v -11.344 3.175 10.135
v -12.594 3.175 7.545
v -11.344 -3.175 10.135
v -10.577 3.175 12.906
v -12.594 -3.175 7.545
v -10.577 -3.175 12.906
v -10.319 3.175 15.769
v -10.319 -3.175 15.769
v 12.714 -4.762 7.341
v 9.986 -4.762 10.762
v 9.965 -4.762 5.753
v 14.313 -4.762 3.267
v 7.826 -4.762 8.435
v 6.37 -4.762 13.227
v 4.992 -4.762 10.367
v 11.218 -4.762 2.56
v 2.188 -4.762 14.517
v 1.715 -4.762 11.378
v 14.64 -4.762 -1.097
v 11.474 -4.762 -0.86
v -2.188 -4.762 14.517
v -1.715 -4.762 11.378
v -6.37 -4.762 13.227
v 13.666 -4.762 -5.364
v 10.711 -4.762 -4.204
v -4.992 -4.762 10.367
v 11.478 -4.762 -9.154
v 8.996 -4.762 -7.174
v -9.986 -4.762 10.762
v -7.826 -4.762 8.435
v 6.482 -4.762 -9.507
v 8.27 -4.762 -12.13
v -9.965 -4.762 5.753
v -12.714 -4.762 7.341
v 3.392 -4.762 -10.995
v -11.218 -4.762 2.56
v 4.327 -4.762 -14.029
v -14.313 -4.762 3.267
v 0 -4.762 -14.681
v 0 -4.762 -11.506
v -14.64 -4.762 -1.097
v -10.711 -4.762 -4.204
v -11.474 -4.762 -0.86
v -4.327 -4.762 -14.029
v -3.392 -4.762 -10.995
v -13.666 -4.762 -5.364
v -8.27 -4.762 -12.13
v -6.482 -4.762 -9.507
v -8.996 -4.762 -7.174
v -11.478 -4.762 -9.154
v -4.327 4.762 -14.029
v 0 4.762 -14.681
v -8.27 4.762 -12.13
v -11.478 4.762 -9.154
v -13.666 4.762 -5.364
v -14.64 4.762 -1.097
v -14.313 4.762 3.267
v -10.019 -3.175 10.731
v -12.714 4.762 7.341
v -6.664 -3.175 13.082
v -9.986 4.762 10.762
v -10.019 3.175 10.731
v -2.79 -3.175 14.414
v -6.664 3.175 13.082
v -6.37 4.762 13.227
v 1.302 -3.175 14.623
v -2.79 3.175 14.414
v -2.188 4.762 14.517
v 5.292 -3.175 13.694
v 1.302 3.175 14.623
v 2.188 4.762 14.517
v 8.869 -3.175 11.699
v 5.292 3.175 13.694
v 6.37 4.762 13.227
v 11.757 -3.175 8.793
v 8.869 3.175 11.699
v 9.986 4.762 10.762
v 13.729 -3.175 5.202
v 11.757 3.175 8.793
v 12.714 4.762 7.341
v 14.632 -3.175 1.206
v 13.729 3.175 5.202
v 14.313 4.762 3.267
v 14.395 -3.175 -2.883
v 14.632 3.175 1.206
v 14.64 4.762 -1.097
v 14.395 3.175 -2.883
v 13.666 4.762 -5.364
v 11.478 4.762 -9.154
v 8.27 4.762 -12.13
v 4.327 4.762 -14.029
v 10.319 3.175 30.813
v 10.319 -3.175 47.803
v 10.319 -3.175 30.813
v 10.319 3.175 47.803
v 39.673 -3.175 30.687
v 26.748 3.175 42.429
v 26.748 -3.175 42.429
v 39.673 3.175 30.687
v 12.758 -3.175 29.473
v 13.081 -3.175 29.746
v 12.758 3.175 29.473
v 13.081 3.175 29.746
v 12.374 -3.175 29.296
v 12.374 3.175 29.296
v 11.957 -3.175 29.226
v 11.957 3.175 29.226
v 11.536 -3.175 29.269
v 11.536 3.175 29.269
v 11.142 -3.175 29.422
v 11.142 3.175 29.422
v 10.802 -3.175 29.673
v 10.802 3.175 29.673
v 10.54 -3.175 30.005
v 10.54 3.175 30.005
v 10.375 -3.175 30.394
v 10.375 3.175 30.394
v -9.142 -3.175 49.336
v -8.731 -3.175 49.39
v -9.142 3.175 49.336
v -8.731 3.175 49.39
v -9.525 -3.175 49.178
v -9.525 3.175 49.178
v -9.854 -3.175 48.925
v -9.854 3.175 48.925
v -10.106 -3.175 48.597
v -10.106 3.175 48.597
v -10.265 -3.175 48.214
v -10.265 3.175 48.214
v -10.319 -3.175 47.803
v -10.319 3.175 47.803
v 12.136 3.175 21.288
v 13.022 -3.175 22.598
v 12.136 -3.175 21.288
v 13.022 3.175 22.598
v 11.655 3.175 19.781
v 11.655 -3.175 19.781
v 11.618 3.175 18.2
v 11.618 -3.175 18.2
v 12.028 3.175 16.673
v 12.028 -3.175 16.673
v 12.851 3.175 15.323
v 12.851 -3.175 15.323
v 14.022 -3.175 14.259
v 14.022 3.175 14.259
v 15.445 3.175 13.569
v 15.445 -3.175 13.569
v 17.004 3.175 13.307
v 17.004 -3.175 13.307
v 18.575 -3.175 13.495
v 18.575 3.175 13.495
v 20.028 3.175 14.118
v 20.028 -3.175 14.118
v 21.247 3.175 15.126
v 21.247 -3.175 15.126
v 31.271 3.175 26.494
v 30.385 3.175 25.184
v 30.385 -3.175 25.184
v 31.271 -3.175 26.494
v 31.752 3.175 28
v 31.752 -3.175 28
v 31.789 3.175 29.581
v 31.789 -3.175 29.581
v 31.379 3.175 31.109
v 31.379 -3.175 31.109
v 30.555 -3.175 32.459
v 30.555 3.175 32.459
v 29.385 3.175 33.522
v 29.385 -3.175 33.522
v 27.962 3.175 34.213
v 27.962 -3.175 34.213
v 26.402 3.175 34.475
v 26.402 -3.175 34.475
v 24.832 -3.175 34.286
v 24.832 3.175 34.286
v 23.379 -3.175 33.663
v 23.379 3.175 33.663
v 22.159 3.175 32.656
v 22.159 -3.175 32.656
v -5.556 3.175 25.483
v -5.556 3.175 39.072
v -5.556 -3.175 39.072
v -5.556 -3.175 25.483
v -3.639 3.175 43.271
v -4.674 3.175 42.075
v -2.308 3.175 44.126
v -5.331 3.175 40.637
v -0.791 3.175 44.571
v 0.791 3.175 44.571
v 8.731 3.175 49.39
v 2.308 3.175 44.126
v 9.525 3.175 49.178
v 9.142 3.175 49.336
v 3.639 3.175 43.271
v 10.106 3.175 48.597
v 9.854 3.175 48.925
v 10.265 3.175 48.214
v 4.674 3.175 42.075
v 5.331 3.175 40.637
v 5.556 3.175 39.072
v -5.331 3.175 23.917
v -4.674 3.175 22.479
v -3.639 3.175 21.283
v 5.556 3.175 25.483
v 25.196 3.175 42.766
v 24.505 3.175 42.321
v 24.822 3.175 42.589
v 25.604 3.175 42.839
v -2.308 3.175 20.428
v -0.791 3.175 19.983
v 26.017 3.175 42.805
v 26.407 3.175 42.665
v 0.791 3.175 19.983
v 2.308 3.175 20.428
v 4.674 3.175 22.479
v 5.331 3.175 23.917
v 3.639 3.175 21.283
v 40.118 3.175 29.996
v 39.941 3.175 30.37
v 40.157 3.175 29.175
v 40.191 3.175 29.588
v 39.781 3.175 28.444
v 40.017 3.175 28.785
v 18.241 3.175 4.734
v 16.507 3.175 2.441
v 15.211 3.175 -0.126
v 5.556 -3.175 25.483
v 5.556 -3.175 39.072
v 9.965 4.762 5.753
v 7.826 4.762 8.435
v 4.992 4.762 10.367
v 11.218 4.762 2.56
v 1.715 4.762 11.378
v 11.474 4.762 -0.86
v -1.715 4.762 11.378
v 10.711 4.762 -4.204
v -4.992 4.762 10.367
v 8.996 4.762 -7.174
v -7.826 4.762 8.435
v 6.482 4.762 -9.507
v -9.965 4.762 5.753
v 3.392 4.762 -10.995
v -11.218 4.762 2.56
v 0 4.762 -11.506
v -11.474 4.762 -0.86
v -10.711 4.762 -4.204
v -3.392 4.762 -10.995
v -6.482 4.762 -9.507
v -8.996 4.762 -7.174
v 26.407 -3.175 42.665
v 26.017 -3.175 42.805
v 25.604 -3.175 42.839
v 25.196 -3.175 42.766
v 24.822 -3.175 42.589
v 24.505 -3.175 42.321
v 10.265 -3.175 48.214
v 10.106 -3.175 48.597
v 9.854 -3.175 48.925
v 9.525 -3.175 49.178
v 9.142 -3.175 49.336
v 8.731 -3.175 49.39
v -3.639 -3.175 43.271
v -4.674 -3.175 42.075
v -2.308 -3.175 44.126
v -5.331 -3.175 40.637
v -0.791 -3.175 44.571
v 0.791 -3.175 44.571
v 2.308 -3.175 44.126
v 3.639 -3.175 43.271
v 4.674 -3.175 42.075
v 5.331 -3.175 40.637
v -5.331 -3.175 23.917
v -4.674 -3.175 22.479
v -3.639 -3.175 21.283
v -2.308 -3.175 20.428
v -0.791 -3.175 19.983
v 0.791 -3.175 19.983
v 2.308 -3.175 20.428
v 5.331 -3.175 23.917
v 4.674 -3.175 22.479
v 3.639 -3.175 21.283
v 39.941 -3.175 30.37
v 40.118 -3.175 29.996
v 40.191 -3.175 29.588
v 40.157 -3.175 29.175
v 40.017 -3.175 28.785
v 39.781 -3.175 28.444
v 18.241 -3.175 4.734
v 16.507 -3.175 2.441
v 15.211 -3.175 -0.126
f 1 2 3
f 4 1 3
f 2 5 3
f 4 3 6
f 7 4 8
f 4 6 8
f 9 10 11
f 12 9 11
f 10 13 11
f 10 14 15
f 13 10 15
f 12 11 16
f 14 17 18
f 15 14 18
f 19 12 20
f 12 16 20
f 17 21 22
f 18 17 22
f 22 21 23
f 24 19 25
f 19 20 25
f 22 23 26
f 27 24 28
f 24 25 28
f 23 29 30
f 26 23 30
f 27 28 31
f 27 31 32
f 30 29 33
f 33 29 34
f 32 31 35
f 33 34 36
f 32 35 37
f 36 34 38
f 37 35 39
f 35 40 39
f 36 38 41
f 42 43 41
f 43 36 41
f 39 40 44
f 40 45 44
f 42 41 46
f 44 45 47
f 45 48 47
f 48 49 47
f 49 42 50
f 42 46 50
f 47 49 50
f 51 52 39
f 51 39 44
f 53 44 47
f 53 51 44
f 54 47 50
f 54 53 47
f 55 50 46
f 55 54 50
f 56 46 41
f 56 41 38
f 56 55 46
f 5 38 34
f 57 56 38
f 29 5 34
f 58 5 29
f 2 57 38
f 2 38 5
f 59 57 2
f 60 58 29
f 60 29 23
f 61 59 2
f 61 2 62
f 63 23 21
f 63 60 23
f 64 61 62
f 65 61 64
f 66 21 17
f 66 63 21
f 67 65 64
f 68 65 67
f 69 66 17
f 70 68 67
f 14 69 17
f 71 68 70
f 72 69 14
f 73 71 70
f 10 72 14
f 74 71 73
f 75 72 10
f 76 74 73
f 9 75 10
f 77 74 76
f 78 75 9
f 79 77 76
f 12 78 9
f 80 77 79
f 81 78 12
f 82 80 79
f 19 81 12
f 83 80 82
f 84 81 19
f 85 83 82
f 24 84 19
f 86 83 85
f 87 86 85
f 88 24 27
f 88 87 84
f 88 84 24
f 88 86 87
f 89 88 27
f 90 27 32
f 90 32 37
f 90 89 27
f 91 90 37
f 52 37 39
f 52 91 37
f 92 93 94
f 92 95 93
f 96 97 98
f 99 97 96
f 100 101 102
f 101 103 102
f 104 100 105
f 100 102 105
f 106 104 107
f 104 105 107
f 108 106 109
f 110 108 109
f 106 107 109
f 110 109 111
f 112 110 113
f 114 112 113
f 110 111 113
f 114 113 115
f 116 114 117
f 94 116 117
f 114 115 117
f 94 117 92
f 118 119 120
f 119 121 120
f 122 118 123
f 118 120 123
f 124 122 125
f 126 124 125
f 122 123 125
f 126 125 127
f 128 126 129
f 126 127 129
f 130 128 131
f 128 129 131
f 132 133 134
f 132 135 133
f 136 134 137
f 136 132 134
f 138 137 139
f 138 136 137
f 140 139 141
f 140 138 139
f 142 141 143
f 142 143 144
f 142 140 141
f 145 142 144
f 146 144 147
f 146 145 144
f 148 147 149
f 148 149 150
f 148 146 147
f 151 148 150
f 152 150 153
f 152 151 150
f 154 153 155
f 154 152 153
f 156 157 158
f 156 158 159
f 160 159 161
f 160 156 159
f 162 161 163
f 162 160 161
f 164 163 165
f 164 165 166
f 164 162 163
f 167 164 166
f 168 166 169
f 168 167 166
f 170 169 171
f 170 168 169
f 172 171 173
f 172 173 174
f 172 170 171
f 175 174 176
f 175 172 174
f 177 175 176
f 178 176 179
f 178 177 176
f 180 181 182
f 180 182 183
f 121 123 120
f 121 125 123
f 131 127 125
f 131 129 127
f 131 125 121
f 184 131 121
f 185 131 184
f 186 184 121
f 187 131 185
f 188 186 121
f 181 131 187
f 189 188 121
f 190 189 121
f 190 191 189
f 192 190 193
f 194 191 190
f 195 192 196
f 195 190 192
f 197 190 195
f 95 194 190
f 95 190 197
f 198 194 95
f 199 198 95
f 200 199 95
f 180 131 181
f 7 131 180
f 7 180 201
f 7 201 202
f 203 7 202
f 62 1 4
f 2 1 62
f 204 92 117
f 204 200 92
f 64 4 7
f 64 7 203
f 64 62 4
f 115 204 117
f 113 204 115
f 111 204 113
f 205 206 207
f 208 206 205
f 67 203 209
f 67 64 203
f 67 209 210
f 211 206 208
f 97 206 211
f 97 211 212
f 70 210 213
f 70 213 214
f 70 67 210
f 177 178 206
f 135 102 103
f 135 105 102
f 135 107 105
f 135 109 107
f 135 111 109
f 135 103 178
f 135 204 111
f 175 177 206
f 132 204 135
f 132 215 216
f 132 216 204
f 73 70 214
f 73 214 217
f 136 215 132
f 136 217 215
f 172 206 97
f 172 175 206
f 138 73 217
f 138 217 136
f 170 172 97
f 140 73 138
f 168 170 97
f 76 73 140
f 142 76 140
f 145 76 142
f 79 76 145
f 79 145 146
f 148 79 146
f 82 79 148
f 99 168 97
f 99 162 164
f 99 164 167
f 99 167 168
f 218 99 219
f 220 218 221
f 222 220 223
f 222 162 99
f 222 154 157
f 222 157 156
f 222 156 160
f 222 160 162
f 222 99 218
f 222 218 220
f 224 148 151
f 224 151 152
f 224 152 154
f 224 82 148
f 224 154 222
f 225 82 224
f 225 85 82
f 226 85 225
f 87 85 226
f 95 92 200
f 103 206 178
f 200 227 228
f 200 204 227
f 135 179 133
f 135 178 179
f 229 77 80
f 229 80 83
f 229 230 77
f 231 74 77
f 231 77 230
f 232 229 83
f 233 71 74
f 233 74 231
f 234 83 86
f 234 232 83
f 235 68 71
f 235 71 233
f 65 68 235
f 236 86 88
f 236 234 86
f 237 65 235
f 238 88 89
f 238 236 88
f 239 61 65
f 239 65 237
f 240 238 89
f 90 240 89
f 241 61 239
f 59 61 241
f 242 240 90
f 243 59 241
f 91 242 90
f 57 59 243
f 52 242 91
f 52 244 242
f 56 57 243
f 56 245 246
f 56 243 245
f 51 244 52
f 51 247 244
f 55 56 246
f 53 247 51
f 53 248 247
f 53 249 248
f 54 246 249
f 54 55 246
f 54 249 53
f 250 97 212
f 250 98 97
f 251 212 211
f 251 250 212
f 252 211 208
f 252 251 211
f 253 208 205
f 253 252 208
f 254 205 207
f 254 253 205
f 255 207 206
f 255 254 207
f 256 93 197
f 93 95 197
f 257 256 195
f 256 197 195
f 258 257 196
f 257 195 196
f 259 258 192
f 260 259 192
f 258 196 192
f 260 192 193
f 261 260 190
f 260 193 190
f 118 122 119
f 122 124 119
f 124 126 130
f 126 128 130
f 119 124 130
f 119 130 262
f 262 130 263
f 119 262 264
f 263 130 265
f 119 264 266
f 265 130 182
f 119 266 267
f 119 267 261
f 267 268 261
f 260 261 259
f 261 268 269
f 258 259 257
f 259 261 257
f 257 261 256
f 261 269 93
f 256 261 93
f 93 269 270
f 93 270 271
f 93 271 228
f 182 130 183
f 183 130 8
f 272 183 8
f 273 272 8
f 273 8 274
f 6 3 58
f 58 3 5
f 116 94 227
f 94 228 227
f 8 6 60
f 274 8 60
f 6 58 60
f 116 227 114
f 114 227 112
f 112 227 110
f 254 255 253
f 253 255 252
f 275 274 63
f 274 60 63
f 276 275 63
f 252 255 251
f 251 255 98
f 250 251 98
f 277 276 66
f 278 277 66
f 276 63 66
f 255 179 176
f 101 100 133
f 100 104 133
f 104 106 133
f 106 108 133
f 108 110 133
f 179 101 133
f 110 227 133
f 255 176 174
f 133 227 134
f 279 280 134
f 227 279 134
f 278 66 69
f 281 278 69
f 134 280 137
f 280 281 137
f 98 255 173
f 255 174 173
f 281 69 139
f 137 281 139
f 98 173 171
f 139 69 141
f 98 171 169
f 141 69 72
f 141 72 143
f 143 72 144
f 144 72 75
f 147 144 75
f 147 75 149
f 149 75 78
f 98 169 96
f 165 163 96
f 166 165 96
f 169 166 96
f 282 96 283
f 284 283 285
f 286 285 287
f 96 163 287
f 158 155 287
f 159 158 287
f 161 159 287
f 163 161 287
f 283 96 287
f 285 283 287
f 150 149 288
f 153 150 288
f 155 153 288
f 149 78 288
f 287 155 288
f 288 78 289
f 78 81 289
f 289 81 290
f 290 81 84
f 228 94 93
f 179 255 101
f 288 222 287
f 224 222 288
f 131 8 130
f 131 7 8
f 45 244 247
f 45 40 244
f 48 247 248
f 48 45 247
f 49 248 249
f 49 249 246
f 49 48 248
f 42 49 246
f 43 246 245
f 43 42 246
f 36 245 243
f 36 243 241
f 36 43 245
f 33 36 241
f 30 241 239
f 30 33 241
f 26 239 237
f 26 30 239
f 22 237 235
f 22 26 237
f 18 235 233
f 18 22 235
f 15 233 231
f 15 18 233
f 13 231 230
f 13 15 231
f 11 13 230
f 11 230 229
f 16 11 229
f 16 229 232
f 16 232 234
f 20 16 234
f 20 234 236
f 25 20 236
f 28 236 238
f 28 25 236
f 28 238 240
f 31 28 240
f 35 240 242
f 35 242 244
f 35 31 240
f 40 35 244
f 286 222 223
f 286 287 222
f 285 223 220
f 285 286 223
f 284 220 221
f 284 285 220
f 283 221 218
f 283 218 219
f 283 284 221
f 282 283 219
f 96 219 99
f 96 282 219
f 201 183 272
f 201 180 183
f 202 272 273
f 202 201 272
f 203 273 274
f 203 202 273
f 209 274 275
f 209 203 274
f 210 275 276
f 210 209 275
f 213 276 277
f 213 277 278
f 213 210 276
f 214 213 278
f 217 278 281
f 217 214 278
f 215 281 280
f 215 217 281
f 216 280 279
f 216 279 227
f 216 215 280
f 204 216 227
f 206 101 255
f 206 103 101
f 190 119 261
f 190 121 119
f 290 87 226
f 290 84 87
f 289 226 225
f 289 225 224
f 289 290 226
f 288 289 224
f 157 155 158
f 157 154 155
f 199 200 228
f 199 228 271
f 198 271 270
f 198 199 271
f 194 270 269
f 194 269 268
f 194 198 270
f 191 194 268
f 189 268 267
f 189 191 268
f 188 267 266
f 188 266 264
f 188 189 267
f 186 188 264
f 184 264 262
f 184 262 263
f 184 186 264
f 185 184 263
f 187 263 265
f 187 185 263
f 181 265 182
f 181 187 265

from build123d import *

# Parameters (mm, degrees)
SKETCH1_R                      = 14.681199999999999
SKETCH1_R_2                    = 11.5062
BEARING_INSERT_EXTRUDE_DEPTH   = 4.7625
APEX_SLOT_INSERT_EXTRUDE_DEPTH = 3.175
FILLET1_R                      = 16.002
FILLET2_R                      = 1.5875


with BuildPart() as part:
    # Sketch1 → Bearing_Insert_Extrude (new, symmetric)
    with BuildSketch(Plane(origin=(0, 0, 0), x_dir=(1, 0, 0), z_dir=(0, 1, 0))):
        with Locations(Location((0, 0, 0), (0, 0, 90))):
            Circle(SKETCH1_R)
        with Locations(Location((0, 0, 0), (0, 0, 90))):
            Circle(SKETCH1_R_2, mode=Mode.SUBTRACT)
    extrude(amount=BEARING_INSERT_EXTRUDE_DEPTH, both=True)

    # Sketch1<4> → Apex_Slot_Insert_Extrude (add, symmetric)
    with BuildSketch(Plane(origin=(0, 0, 0), x_dir=(1, 0, 0), z_dir=(0, 1, 0))):
        with BuildLine():
            Line((-10.318749999999993, -10.443228996699254), (-10.318749999999994, -49.390299999999996))
            Line((-10.318749999999994, -49.390299999999996), (10.318750000000005, -49.39029999999999))
            Line((10.318750000000005, -49.39029999999999), (10.318750000000005, -26.704691888242454))
            Line((10.318750000000003, -26.704691888242454), (25.572760300589366, -43.49611782976841))
            Line((25.572760300589366, -43.49611782976841), (40.84821825442049, -29.619274148630485))
            Line((40.84821825442049, -29.619274148630485), (14.659851632931186, -0.7914439591308806))
            ThreePointArc((14.659851632931188, -0.7914439591308853), (5.291552650188477, -13.694418716772292), (-10.318749999999994, -10.443228996699252))
        make_face()
        with BuildLine():
            ThreePointArc((5.556250000000003, -39.07155000000002), (3.51e-15, -44.62780000000001), (-5.556249999999994, -39.07155000000002))
            Line((-5.556249999999995, -39.07155000000002), (-5.556249999999993, -25.482550000000018))
            ThreePointArc((-5.556249999999995, -25.482550000000018), (4.34e-15, -19.92630000000002), (5.556250000000002, -25.482550000000018))
            Line((5.556250000000002, -25.482550000000018), (5.556250000000004, -39.07155000000002))
        make_face(mode=Mode.SUBTRACT)
        with BuildLine():
            ThreePointArc((30.384690732198205, -25.183893713515992), (30.00814073570387, -33.0325903075461), (22.159444141673756, -32.65604031105178))
            Line((22.159444141673756, -32.65604031105178), (13.022076302401407, -22.59773876606759))
            ThreePointArc((13.022076302401405, -22.59773876606759), (13.398626298895733, -14.749042172037479), (21.247322892925844, -15.125592168531803))
            Line((21.247322892925844, -15.125592168531803), (30.384690732198205, -25.18389371351599))
        make_face(mode=Mode.SUBTRACT)
    extrude(amount=APEX_SLOT_INSERT_EXTRUDE_DEPTH, both=True)

    # Fillet1
    fillet1_edges = [part.edges().sort_by_distance(p)[0] for p in [
        (14.659851632931186, 0, 0.791443959130883),
        (-10.318749999999994, 0, 10.443228996699252),
    ]]
    fillet(fillet1_edges, radius=FILLET1_R)

    # Fillet2
    fillet2_edges = [part.edges().sort_by_distance(p)[0] for p in [
        (-10.318749999999994, 0, 49.390299999999996),
        (10.318750000000005, 0, 49.39029999999999),
        (10.318750000000005, 0, 26.704691888242454),
        (25.572760300589366, 0, 43.49611782976841),
        (40.84821825442049, 0, 29.619274148630485),
    ]]
    fillet(fillet2_edges, radius=FILLET2_R)


solid = part.part
